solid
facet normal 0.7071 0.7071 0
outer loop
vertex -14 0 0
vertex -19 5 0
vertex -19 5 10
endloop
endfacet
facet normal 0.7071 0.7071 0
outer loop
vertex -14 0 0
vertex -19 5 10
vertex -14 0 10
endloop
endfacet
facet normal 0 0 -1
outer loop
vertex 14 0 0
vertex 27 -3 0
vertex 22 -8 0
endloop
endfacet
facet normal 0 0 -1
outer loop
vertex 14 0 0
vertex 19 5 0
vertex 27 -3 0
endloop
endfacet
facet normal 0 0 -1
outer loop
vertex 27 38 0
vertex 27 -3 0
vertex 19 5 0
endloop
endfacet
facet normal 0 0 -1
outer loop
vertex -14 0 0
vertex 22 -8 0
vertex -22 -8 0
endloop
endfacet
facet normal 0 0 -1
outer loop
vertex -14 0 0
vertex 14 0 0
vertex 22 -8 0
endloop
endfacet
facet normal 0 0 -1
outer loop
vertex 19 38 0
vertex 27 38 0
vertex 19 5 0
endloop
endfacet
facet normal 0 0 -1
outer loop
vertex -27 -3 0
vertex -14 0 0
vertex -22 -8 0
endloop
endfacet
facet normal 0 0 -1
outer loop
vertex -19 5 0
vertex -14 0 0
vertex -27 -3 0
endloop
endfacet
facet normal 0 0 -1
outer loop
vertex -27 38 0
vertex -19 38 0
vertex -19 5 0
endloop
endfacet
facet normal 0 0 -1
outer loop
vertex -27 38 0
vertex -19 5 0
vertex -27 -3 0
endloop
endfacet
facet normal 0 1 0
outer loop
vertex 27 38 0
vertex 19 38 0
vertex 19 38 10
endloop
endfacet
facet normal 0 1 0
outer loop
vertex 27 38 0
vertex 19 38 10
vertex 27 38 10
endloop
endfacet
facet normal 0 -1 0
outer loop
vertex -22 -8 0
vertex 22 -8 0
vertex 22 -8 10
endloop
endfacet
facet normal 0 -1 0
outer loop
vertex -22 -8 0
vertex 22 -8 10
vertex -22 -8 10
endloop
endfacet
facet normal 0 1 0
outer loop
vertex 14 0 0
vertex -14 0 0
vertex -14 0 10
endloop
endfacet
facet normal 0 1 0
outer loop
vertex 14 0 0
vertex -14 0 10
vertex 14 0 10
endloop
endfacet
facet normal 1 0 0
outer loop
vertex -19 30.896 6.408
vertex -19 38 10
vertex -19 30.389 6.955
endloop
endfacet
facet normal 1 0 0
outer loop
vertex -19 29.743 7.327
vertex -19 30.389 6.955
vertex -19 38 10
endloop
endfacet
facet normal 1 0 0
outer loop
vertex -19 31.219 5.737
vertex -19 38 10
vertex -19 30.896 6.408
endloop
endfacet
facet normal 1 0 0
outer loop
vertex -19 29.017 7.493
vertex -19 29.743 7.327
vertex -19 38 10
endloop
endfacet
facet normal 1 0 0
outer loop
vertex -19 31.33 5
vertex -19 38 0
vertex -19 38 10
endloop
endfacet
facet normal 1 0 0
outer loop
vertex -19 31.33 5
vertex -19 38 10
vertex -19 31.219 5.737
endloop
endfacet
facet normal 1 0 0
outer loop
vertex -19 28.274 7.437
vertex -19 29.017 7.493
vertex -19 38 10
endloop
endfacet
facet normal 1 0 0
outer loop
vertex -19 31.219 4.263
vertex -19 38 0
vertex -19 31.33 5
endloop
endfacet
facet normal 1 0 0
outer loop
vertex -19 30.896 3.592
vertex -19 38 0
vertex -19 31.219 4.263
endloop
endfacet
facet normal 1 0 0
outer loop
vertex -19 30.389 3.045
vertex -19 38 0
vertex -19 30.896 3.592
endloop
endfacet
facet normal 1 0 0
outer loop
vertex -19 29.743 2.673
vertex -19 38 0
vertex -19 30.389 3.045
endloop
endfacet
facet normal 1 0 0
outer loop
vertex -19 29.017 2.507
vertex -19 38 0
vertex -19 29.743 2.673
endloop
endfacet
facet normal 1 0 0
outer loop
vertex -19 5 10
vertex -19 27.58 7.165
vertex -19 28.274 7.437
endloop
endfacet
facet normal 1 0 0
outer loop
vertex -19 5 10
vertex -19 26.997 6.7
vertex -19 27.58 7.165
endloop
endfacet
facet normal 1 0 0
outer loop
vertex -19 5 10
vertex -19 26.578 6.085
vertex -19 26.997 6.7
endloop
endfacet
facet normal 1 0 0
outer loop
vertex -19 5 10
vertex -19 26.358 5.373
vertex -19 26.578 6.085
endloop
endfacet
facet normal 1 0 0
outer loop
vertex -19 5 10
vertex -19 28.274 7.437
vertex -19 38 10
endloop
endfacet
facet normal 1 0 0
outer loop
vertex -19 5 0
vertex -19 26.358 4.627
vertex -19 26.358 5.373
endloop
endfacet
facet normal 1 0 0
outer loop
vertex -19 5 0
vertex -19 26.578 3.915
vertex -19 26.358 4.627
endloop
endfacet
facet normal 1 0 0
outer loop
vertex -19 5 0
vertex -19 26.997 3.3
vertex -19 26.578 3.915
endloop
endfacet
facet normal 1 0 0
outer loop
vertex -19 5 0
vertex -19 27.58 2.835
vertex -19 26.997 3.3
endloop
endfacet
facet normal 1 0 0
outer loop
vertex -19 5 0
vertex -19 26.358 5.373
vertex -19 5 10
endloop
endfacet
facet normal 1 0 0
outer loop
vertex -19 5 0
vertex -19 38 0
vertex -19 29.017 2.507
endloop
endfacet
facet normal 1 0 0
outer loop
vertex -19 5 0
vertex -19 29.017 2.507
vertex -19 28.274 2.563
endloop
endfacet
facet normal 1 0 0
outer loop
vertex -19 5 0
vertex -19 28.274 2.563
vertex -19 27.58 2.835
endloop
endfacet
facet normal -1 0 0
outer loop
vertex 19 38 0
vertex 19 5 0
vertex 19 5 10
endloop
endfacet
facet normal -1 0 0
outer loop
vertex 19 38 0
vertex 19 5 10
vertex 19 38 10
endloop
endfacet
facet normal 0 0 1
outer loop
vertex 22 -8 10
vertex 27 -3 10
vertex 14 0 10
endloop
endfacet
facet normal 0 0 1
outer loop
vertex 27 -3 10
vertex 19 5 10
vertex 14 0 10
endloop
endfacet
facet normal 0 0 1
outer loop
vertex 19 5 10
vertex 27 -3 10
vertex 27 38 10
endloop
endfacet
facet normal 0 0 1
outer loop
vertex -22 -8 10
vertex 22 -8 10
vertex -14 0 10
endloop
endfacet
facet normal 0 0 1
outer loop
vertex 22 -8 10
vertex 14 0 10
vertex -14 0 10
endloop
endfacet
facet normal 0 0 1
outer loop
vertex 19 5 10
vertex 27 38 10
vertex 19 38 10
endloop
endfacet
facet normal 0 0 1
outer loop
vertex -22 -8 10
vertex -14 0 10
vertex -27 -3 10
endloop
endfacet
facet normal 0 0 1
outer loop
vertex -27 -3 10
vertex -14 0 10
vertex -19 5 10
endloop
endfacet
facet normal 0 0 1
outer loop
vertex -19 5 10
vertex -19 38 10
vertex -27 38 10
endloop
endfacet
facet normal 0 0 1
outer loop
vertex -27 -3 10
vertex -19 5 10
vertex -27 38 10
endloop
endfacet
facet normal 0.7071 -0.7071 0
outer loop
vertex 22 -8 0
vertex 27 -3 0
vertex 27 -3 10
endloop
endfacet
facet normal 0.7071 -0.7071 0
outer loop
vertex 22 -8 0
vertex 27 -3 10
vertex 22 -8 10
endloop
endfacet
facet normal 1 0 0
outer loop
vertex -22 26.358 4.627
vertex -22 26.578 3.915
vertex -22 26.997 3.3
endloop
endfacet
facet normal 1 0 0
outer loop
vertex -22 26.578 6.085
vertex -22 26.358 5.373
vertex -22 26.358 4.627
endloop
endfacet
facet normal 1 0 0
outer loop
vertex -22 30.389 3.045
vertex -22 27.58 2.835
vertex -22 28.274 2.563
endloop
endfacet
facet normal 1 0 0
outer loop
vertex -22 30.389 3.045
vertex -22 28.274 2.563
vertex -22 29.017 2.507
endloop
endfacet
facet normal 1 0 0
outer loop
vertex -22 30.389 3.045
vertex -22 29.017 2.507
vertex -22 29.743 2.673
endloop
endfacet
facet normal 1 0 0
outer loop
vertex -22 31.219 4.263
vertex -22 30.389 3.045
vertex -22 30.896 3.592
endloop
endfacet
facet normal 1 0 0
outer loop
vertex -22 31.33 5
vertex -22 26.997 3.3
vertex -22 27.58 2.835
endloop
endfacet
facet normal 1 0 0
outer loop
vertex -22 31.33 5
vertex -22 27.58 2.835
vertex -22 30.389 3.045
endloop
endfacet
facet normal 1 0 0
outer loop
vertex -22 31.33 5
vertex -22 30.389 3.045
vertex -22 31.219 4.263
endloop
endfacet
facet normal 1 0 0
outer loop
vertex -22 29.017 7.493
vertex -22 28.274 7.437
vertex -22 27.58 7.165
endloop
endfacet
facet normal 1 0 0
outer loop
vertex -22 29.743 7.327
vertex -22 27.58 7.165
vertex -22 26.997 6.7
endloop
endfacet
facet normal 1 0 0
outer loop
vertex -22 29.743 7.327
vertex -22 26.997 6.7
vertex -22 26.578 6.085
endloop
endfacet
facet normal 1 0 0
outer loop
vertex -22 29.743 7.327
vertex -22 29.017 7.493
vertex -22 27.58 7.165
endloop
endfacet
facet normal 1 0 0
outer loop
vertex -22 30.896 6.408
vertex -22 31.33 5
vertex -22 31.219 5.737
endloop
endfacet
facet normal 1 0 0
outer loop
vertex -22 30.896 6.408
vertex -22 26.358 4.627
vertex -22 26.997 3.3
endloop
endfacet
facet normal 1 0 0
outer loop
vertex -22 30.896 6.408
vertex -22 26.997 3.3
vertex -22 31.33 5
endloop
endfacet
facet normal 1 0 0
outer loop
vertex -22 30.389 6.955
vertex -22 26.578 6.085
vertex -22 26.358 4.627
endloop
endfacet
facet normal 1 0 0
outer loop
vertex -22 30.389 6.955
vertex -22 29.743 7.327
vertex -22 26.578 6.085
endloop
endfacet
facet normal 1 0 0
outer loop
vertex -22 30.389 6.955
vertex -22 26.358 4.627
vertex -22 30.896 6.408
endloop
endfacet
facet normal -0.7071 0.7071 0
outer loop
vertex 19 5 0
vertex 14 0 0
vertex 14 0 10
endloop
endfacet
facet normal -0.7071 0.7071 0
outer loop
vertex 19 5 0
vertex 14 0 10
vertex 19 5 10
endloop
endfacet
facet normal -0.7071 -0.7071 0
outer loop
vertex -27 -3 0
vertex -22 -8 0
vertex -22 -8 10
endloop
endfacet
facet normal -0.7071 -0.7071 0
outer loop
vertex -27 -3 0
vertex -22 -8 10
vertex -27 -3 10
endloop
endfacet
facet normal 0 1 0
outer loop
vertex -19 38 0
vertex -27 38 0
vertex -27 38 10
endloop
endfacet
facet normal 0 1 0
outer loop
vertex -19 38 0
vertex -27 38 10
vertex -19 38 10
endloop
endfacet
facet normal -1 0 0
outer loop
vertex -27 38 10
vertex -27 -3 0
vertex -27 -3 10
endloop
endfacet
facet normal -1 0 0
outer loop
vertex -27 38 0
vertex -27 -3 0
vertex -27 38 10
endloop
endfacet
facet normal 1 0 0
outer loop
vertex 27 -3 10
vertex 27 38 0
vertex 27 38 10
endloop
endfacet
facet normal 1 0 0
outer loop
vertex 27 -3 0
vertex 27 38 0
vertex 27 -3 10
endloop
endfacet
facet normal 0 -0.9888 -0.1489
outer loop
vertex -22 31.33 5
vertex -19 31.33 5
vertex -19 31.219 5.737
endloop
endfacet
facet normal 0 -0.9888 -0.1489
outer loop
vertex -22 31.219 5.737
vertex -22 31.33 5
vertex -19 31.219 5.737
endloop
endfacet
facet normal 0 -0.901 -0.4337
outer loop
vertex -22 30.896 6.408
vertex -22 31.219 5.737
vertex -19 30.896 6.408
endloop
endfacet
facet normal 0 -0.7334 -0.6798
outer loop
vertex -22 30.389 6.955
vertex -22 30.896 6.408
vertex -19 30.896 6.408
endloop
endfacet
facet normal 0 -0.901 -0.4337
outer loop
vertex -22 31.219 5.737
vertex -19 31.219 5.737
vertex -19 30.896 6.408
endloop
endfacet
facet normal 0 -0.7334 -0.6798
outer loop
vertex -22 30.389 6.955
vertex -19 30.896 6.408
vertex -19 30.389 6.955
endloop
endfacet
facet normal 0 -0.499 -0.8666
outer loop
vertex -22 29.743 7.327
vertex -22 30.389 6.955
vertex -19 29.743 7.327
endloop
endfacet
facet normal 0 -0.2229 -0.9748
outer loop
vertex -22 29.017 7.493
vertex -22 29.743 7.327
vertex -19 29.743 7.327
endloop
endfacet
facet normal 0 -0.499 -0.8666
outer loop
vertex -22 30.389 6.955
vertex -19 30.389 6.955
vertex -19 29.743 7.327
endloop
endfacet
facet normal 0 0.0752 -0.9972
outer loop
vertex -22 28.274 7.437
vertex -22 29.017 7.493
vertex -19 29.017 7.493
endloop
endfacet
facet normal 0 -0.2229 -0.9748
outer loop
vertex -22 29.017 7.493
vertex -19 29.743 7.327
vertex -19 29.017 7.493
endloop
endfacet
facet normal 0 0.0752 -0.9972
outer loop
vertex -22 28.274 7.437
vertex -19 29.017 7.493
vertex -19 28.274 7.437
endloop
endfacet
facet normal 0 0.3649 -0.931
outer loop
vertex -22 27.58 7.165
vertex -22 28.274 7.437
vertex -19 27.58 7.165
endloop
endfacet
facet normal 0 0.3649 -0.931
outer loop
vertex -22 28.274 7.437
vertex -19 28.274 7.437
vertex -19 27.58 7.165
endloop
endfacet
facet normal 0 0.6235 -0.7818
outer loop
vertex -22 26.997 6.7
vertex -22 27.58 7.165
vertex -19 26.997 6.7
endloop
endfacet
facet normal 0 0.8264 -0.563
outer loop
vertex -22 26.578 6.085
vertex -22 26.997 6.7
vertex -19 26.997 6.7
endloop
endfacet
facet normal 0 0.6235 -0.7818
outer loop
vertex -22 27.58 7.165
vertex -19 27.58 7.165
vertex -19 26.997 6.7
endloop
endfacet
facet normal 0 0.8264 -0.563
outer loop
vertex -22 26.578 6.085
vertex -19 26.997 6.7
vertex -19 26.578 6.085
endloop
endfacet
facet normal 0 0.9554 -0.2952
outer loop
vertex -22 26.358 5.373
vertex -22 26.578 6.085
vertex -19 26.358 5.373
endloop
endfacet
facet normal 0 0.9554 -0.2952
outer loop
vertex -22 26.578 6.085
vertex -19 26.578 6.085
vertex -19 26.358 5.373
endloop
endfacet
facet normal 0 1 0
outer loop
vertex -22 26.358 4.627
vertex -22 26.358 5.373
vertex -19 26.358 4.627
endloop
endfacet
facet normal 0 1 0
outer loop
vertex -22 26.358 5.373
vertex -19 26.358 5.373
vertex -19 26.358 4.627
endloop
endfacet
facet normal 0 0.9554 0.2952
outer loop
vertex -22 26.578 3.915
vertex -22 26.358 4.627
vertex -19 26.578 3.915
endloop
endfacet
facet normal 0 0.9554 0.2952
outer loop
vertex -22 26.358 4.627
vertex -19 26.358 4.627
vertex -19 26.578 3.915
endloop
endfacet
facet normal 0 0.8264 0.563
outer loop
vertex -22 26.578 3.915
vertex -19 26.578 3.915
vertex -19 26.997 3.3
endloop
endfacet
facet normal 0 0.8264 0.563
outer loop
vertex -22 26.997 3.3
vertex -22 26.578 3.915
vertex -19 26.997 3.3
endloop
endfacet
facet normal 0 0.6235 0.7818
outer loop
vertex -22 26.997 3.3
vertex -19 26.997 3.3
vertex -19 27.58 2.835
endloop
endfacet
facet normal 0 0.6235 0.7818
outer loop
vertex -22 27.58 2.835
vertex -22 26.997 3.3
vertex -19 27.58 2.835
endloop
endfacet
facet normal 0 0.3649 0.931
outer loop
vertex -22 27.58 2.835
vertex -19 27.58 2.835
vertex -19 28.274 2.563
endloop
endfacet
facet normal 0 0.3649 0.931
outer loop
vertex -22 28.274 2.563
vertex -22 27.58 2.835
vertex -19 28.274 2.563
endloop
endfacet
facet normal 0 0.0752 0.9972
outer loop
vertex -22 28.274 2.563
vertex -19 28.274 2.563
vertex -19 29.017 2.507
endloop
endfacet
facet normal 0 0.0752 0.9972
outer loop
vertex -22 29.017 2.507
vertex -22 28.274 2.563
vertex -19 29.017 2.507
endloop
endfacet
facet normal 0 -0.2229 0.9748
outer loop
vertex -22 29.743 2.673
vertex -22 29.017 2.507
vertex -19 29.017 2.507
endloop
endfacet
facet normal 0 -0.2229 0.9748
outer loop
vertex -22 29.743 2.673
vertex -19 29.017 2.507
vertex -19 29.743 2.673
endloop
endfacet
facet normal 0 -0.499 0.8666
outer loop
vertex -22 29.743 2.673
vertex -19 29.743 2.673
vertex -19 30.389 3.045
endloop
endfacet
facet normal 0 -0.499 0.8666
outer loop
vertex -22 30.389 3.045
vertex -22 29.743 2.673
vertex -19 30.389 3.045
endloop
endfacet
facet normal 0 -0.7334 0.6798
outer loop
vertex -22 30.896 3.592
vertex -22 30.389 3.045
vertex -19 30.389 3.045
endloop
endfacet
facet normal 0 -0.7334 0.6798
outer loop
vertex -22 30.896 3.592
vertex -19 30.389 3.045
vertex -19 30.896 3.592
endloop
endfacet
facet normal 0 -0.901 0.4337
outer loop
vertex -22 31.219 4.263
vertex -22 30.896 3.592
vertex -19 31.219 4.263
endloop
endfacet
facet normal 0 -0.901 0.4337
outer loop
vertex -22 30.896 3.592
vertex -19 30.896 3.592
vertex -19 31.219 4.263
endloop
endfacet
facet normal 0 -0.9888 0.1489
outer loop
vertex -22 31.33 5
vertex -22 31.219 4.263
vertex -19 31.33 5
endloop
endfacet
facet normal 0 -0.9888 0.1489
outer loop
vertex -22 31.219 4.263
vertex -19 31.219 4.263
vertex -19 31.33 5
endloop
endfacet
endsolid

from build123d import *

# Parameters (mm, degrees)
BOSS_EXTRUDE1_DEPTH = 10
SKETCH2_R           = 2.5
CUT_EXTRUDE1_DEPTH  = 3


with BuildPart() as part:
    # Sketch1 → Boss-Extrude1 (new body)
    with BuildSketch(Plane.XY):
        Polygon((-27, 38), (-19, 38), (-19, 5), (-14, 0), (14, 0), (19, 5), (19, 38), (27, 38), (27, -3), (22, -8), (-22, -8), (-27, -3), align=None)
    extrude(amount=BOSS_EXTRUDE1_DEPTH)

    # Sketch2 → Cut-Extrude1 (cut)
    with BuildSketch(Plane(origin=(-19, 0, 0), x_dir=(0, 0, -1), z_dir=(1, 0, 0))):
        with Locations(Location((-5, 28.83, 0), (0, 0, 90))):
            Circle(SKETCH2_R)
    extrude(amount=-CUT_EXTRUDE1_DEPTH, mode=Mode.SUBTRACT)


solid = part.part
